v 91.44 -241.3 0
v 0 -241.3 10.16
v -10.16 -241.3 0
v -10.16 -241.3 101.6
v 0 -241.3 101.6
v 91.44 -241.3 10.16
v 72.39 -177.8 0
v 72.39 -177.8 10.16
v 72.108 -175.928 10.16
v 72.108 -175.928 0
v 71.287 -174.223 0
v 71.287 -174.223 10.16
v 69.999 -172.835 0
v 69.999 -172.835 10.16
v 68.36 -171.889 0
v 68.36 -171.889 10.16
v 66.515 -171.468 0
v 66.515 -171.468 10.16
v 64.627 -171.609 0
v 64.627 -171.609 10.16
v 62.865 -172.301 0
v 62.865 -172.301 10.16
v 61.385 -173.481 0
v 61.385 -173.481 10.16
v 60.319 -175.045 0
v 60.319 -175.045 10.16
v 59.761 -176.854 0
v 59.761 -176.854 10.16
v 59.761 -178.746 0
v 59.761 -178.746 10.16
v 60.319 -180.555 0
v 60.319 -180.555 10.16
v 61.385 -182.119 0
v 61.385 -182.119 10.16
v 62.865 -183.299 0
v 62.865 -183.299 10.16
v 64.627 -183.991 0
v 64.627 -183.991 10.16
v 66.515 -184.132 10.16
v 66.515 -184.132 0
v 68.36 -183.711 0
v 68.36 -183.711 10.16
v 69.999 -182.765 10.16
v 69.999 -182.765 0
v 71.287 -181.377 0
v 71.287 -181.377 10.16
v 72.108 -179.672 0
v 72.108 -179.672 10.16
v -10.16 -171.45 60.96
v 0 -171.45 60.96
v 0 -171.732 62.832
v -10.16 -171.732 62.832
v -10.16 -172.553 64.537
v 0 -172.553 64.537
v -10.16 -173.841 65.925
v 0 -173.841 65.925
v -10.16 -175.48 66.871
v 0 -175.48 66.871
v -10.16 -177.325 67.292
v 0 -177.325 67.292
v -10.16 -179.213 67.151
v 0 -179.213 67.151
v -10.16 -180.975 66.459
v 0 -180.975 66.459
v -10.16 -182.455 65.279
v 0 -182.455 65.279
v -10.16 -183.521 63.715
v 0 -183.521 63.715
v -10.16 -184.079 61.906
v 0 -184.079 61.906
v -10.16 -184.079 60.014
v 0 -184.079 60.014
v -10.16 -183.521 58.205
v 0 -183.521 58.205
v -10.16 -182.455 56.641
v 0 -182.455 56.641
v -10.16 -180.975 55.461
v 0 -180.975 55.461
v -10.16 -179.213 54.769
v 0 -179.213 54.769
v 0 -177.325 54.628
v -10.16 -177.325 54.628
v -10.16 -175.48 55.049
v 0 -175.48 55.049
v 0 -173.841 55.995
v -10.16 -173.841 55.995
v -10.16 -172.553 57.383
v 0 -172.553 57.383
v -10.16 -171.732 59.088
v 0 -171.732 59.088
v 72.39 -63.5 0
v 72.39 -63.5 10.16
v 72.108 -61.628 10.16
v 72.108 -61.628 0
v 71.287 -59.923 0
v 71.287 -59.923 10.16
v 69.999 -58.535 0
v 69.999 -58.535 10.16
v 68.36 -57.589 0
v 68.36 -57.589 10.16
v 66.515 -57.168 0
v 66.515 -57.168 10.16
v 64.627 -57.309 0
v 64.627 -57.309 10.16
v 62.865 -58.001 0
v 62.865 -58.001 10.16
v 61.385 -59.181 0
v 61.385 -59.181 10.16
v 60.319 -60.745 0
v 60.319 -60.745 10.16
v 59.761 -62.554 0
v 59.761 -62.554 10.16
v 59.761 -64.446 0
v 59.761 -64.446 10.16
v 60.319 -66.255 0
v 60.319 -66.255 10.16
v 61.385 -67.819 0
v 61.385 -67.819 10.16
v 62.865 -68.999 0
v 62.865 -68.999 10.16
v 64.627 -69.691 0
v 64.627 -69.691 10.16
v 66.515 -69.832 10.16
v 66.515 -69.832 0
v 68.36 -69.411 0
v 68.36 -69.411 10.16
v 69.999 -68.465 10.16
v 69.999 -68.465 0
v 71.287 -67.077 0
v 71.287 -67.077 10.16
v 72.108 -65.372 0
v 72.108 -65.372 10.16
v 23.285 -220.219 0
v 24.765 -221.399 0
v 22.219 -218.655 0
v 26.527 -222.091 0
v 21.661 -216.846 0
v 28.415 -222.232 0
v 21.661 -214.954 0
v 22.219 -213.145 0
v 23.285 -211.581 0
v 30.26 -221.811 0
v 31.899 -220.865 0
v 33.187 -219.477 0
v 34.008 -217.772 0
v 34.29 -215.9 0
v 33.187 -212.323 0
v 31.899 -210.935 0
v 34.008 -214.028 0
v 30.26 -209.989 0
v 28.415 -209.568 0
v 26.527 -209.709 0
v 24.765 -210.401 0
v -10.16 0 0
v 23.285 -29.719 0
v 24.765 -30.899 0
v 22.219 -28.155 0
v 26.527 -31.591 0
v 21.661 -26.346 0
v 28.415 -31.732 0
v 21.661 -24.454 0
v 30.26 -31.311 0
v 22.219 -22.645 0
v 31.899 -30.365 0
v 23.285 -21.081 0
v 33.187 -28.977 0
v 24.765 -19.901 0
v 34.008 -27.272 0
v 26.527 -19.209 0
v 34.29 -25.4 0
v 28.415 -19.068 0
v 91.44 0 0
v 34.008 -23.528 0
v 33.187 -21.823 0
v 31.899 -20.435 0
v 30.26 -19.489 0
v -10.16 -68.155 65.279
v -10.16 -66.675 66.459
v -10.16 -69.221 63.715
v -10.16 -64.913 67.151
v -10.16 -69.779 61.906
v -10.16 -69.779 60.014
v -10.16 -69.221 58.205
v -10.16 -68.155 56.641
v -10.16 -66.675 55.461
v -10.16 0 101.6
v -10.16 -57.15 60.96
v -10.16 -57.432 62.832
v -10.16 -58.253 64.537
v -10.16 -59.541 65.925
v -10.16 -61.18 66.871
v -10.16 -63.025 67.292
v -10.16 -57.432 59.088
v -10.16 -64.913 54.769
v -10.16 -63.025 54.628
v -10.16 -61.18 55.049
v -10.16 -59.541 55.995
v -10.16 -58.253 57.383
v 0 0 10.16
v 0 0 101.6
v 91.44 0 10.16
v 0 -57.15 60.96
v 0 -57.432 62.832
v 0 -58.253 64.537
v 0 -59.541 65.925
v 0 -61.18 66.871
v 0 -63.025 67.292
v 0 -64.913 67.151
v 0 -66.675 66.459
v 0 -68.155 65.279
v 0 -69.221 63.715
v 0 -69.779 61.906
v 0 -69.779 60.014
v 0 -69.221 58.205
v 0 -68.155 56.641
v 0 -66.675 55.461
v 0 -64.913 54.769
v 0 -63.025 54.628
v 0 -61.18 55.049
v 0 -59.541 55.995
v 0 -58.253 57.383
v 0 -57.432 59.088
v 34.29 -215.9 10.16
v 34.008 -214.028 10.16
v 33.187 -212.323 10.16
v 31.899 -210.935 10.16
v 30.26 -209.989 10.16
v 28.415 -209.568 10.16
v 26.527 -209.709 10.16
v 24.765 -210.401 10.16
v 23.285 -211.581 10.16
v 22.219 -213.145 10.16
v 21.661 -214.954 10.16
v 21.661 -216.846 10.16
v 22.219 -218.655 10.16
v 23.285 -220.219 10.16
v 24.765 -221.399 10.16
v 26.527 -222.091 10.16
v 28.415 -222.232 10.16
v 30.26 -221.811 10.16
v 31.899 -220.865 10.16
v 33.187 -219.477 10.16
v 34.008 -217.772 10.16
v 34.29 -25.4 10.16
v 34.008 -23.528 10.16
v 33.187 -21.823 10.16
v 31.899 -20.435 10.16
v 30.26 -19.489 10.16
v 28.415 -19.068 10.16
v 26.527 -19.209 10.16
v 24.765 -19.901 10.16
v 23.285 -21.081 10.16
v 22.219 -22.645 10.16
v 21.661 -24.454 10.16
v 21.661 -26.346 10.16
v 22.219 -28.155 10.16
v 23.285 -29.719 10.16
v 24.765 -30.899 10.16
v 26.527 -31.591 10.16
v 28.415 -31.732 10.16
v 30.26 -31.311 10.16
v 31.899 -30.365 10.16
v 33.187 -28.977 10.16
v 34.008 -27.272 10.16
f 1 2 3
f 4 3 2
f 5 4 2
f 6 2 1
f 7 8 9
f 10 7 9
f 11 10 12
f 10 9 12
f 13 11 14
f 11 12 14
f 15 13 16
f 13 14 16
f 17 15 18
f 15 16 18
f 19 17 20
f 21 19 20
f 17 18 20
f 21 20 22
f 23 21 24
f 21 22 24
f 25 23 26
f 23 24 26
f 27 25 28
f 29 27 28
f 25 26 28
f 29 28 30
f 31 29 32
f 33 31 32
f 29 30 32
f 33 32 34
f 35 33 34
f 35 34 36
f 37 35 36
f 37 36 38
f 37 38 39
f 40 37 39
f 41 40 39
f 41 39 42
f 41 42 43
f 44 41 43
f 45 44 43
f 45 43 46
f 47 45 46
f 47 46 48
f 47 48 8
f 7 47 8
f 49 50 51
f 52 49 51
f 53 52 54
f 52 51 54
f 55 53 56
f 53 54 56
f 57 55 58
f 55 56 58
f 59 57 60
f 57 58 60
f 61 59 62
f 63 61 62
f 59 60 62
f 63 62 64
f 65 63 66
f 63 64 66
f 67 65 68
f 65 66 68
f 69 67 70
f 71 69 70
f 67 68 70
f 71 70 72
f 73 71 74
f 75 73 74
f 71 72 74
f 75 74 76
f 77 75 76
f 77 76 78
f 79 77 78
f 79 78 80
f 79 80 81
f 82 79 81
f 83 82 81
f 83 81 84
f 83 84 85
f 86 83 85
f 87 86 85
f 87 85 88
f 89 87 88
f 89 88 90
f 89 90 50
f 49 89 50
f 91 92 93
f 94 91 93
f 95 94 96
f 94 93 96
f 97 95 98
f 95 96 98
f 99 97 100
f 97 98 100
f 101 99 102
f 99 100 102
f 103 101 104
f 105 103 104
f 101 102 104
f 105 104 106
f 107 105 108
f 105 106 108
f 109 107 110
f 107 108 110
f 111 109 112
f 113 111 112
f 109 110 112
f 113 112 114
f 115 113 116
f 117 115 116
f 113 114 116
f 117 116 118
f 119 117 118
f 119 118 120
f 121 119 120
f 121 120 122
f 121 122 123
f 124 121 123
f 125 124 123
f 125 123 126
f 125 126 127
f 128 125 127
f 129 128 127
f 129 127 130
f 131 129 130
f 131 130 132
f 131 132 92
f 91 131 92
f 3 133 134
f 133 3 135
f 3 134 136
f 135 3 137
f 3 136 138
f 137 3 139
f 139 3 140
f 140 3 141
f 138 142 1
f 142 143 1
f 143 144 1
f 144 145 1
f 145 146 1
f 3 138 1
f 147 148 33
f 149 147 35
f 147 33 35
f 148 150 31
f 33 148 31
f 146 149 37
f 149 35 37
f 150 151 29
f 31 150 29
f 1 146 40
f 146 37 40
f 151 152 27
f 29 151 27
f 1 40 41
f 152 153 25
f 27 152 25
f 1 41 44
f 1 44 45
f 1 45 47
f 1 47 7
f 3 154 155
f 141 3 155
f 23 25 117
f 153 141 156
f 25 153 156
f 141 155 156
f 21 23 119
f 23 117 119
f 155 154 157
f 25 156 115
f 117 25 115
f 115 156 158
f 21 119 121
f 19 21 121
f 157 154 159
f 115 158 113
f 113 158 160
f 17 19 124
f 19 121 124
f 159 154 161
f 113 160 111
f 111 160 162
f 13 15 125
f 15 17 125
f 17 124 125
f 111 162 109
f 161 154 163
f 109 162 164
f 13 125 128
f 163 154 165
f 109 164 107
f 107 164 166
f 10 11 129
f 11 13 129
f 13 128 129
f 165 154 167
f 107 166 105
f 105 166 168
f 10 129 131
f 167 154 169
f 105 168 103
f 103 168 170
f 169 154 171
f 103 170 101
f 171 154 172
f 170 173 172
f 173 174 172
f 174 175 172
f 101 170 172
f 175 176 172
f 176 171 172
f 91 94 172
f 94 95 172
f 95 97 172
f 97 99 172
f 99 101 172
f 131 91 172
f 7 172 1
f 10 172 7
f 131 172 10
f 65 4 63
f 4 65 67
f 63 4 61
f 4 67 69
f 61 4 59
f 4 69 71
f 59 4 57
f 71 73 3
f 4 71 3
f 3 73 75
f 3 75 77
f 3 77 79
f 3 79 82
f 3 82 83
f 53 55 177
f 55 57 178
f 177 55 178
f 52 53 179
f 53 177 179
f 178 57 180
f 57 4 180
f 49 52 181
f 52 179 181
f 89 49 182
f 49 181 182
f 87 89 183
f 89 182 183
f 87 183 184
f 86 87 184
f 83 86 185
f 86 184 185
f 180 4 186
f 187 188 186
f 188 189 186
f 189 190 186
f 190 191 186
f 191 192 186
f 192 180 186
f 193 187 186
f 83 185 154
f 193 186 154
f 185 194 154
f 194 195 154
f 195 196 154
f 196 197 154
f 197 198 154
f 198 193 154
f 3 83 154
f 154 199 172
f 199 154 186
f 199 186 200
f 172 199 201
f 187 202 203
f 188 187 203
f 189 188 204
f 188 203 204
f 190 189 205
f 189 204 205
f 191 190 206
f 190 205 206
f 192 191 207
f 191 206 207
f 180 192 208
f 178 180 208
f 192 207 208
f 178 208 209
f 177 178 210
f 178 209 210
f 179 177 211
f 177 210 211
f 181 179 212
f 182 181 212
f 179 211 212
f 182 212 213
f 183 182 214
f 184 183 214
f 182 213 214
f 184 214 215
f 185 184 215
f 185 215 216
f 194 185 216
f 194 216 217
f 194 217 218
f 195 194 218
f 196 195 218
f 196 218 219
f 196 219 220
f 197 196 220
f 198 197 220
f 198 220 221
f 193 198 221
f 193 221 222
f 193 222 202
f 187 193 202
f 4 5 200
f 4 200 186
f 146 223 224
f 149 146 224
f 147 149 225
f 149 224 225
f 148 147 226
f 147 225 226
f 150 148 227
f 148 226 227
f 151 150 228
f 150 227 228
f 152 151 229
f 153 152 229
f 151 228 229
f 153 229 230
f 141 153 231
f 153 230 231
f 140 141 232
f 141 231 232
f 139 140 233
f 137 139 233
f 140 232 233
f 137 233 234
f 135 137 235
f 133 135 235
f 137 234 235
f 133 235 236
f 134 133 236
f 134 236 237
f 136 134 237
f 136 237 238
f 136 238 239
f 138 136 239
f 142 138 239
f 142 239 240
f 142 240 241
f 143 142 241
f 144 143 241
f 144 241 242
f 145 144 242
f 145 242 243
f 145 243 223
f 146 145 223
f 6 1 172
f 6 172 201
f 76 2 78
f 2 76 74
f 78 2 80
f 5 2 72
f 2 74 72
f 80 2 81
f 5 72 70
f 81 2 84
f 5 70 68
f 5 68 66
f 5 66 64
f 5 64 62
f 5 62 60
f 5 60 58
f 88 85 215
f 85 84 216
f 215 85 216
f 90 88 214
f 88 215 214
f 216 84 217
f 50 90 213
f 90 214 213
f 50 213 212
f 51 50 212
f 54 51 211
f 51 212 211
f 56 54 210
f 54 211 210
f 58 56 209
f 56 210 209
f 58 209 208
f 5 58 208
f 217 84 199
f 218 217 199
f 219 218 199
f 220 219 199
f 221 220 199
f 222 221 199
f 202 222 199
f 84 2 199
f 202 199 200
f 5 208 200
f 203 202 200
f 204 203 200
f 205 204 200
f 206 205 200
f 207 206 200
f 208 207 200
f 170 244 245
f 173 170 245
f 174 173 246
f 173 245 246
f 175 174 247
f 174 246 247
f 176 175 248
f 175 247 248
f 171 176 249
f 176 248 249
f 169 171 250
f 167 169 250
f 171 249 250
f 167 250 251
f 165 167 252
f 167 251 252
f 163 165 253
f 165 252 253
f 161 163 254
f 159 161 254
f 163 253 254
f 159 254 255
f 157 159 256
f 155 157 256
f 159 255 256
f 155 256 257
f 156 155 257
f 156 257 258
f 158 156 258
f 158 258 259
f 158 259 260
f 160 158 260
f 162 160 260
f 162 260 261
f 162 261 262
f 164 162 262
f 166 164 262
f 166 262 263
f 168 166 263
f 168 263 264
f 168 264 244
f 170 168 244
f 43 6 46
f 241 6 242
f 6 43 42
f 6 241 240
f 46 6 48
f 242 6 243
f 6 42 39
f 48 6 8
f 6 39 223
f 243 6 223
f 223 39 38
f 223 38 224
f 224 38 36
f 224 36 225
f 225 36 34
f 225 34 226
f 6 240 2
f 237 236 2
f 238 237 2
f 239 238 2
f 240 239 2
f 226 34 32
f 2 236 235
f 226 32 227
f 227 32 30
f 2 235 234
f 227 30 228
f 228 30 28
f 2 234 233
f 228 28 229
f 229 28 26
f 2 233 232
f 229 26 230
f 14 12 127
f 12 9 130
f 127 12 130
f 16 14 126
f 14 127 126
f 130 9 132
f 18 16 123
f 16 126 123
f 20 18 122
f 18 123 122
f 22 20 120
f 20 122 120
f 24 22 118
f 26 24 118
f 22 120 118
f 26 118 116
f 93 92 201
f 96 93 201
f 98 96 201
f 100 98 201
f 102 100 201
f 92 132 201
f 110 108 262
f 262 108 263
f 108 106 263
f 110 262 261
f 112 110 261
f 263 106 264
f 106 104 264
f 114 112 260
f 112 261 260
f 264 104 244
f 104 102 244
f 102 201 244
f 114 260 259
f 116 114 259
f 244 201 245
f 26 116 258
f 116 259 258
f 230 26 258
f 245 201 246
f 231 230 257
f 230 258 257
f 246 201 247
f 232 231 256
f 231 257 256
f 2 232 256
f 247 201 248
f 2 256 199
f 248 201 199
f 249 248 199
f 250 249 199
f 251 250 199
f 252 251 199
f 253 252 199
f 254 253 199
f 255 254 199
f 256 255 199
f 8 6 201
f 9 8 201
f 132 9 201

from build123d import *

# Parameters (mm, degrees)
F1_DEPTH = 241.3
F2_R     = 6.35
F3_DEPTH = 50.8
F4_R     = 6.35
F5_DEPTH = 25.4


with BuildPart() as f1:
    # F0 (on Front) → F1 (new body)
    with BuildSketch(Plane.XZ):
        Polygon((-10.16, 0), (0, 0), (91.44, 0), (91.44, 10.16), (0, 10.16), (0, 101.6), (-10.16, 101.6), (-10.16, 10.16), align=None)
    extrude(amount=F1_DEPTH)

    # F2 (on face) → F3 (cut)
    with BuildSketch(Plane.XY.offset(10.16)):
        with Locations((27.94, -25.4)):
            Circle(F2_R)
        with Locations((66.04, -63.5)):
            Circle(F2_R)
        with Locations((66.04, -177.8)):
            Circle(F2_R)
        with Locations((27.94, -215.9)):
            Circle(F2_R)
    extrude(amount=-F3_DEPTH, mode=Mode.SUBTRACT)

    # F4 (on face) → F5 (cut)
    with BuildSketch(Plane.YZ):
        with Locations((-177.8, 60.96)):
            Circle(F4_R)
        with Locations((-63.5, 60.96)):
            Circle(F4_R)
    extrude(amount=-F5_DEPTH, mode=Mode.SUBTRACT)


solid = f1.part
